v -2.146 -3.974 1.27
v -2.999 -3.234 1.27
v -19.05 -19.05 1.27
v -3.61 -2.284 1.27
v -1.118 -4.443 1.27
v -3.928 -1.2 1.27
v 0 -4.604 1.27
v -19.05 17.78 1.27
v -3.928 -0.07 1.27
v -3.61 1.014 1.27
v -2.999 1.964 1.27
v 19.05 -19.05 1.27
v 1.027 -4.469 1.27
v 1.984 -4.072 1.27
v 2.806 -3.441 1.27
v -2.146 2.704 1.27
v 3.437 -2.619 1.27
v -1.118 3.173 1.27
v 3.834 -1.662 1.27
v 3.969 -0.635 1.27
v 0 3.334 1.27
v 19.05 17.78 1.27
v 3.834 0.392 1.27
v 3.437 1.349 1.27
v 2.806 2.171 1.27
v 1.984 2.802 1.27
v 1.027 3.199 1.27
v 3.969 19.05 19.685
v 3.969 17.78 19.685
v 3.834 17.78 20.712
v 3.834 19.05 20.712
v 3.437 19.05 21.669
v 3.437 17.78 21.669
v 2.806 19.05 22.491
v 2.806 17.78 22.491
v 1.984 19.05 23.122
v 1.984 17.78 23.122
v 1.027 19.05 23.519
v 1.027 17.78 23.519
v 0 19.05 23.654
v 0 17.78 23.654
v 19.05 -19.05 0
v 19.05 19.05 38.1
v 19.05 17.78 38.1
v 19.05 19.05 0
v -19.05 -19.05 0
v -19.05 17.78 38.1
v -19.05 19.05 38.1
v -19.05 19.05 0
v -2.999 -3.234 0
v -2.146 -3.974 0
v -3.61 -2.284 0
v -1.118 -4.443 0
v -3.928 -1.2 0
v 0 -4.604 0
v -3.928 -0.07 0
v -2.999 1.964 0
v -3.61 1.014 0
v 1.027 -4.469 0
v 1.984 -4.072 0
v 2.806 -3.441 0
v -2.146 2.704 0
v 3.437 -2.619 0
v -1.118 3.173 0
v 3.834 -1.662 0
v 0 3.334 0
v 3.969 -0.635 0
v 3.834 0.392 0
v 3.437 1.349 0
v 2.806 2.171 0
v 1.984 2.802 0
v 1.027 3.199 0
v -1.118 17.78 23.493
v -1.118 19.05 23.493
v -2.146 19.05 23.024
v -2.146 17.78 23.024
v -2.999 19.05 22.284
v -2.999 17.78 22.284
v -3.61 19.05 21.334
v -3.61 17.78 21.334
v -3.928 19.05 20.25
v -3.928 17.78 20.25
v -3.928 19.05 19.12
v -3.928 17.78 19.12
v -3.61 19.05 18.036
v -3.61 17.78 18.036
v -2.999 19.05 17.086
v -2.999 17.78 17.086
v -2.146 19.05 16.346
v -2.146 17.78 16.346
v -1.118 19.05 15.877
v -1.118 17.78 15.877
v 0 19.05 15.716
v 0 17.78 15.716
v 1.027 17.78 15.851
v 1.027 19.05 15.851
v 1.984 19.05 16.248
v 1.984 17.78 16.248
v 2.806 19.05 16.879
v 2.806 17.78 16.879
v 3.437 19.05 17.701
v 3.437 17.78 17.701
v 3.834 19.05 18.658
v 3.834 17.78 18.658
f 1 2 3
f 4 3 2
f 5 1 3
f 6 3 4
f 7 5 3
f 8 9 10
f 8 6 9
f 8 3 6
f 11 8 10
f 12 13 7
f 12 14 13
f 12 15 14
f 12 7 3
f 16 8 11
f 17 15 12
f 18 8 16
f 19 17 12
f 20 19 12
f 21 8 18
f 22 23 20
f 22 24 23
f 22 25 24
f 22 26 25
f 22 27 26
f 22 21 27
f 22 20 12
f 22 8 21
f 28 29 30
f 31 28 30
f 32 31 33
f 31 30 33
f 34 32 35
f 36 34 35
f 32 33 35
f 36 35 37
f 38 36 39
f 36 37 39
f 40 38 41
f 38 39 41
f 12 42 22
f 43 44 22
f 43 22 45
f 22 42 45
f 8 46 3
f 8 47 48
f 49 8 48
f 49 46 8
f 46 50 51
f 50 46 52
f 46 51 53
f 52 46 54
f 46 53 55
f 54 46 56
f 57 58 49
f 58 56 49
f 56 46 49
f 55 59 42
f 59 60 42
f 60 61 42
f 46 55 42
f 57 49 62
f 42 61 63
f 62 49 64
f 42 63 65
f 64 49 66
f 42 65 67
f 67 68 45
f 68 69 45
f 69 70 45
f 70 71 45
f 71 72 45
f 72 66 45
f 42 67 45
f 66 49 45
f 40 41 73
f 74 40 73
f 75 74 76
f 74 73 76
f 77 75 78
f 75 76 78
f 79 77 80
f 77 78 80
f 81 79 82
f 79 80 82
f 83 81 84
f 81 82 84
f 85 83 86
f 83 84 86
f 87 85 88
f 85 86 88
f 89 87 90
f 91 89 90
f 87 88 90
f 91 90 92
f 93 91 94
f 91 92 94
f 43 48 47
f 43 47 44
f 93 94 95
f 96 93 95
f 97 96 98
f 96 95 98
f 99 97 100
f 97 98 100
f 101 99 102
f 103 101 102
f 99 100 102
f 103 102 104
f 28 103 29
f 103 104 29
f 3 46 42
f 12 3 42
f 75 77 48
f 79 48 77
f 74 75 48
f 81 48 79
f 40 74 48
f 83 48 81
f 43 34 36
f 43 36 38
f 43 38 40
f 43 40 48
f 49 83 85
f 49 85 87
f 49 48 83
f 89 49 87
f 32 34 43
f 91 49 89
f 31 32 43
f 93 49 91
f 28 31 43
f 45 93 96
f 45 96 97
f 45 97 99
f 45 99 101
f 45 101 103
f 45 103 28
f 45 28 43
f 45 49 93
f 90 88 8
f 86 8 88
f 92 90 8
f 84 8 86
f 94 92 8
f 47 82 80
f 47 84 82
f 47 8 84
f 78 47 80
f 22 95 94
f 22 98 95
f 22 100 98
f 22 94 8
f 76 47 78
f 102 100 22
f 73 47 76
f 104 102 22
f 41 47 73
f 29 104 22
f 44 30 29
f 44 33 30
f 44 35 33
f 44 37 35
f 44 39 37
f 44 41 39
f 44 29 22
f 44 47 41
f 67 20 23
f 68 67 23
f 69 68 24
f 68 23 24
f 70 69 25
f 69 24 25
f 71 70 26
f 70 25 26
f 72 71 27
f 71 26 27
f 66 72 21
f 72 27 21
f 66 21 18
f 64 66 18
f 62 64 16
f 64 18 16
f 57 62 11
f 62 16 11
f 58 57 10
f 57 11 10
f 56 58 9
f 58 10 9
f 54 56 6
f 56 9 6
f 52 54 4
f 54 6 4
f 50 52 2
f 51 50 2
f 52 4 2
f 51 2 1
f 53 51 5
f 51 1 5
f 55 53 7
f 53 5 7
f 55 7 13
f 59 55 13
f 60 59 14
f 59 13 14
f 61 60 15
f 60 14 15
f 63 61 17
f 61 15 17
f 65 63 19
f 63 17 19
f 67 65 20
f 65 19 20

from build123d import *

# Parameters (mm, degrees)
F0_W     = 38.1
F0_H     = 38.1
F1_DEPTH = 38.1
F2_W     = 38.1
F2_H     = 36.83
F3_DEPTH = 36.83
F6_DEPTH = 3.81
F7_DEPTH = 4.826


with BuildPart() as f1:
    # F0 (on Top) → F1 (new body)
    with BuildSketch(Plane.XY):
        Rectangle(F0_W, F0_H)
    extrude(amount=F1_DEPTH)

    # F2 (on face) → F3 (cut)
    with BuildSketch(Plane.XY.offset(38.1)):
        with Locations((0, -0.635)):
            Rectangle(F2_W, F2_H)
    extrude(amount=-F3_DEPTH, mode=Mode.SUBTRACT)

    # F4 (on face) → F6 (cut)
    with BuildSketch(Plane.XZ.offset(-17.78)):
        with BuildLine():
            ThreePointArc((3.96875, 19.685), (2.80633, 22.49133), (0, 23.65375))
            Line((0, 23.65375), (0, 15.71625))
            ThreePointArc((0, 15.71625), (2.80633, 16.87867), (3.96875, 19.685))
        make_face()
        with BuildLine():
            Line((0, 15.71625), (0, 23.65375))
            ThreePointArc((0, 23.65375), (-3.96875, 19.685), (0, 15.71625))
        make_face()
    extrude(amount=-F6_DEPTH, mode=Mode.SUBTRACT)

    # F5 (on face) → F7 (cut)
    with BuildSketch(Plane.XY.offset(1.27)):
        with BuildLine():
            ThreePointArc((3.96875, -0.635), (2.80633, 2.17133), (0, 3.33375))
            Line((0, 3.33375), (0, -4.60375))
            ThreePointArc((0, -4.60375), (2.80633, -3.44133), (3.96875, -0.635))
        make_face()
        with BuildLine():
            Line((0, -4.60375), (0, 3.33375))
            ThreePointArc((0, 3.33375), (-3.96875, -0.635), (0, -4.60375))
        make_face()
    extrude(amount=-F7_DEPTH, mode=Mode.SUBTRACT)


solid = f1.part
